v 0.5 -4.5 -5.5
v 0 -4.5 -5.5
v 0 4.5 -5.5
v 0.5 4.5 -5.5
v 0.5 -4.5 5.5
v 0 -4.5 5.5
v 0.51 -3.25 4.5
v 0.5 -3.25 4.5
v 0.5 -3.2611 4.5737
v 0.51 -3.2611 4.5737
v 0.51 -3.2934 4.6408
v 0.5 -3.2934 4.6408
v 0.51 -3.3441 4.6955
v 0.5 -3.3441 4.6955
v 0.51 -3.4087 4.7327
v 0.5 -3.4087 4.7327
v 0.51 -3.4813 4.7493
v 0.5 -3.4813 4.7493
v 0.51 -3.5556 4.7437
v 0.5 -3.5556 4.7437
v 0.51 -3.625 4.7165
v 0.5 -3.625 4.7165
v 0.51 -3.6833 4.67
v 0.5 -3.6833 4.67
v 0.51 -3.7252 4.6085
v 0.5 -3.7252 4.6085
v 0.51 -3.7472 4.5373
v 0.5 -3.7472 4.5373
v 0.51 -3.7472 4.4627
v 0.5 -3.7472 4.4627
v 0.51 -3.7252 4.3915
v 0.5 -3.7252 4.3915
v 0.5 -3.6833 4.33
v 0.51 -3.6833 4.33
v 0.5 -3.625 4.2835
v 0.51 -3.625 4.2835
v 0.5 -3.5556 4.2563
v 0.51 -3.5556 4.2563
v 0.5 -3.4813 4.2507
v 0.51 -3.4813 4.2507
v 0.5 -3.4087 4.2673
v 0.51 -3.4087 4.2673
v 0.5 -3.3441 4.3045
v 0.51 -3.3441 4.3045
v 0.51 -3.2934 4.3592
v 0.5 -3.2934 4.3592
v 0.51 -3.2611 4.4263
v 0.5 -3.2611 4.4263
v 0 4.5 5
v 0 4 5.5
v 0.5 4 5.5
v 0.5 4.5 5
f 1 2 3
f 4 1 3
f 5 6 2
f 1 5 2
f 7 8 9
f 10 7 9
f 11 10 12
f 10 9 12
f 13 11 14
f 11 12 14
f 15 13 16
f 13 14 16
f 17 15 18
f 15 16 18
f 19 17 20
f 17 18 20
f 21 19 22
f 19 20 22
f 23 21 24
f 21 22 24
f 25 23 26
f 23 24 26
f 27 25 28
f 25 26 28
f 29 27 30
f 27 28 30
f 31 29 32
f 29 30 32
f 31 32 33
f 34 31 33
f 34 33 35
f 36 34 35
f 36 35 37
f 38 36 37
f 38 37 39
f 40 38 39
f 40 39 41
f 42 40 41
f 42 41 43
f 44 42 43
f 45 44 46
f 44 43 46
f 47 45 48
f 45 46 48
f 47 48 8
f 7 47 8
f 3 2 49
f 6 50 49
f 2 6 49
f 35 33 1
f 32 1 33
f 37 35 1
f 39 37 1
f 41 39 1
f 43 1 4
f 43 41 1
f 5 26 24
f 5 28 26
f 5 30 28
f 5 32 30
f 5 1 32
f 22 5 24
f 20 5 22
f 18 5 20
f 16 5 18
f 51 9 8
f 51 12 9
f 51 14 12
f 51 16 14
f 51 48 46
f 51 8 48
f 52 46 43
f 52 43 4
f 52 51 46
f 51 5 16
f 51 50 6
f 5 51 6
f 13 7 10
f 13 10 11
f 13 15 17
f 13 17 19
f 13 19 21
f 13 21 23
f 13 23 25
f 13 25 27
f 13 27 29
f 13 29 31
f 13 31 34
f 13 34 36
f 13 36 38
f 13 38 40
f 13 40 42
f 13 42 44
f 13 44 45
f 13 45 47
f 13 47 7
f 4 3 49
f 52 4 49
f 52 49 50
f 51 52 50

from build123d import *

# Parameters (mm, degrees)
PAD_DEPTH    = 0.5
SKETCH001_R  = 0.25
PAD001_DEPTH = 0.01


with BuildPart() as part:
    # Sketch (on YZ_Plane of Origin) → Pad (new body)
    with BuildSketch(Plane.YZ):
        Polygon((-4.5, -5.5), (4.5, -5.5), (4.5, 5), (4, 5.5), (-4.5, 5.5), align=None)
    extrude(amount=PAD_DEPTH)

    # Sketch001 (on Face7 of Pad) → Pad001 (join)
    with BuildSketch(Plane.YZ.offset(0.5)):
        with Locations((-3.5, 4.5)):
            Circle(SKETCH001_R)
    extrude(amount=PAD001_DEPTH)


solid = part.part
